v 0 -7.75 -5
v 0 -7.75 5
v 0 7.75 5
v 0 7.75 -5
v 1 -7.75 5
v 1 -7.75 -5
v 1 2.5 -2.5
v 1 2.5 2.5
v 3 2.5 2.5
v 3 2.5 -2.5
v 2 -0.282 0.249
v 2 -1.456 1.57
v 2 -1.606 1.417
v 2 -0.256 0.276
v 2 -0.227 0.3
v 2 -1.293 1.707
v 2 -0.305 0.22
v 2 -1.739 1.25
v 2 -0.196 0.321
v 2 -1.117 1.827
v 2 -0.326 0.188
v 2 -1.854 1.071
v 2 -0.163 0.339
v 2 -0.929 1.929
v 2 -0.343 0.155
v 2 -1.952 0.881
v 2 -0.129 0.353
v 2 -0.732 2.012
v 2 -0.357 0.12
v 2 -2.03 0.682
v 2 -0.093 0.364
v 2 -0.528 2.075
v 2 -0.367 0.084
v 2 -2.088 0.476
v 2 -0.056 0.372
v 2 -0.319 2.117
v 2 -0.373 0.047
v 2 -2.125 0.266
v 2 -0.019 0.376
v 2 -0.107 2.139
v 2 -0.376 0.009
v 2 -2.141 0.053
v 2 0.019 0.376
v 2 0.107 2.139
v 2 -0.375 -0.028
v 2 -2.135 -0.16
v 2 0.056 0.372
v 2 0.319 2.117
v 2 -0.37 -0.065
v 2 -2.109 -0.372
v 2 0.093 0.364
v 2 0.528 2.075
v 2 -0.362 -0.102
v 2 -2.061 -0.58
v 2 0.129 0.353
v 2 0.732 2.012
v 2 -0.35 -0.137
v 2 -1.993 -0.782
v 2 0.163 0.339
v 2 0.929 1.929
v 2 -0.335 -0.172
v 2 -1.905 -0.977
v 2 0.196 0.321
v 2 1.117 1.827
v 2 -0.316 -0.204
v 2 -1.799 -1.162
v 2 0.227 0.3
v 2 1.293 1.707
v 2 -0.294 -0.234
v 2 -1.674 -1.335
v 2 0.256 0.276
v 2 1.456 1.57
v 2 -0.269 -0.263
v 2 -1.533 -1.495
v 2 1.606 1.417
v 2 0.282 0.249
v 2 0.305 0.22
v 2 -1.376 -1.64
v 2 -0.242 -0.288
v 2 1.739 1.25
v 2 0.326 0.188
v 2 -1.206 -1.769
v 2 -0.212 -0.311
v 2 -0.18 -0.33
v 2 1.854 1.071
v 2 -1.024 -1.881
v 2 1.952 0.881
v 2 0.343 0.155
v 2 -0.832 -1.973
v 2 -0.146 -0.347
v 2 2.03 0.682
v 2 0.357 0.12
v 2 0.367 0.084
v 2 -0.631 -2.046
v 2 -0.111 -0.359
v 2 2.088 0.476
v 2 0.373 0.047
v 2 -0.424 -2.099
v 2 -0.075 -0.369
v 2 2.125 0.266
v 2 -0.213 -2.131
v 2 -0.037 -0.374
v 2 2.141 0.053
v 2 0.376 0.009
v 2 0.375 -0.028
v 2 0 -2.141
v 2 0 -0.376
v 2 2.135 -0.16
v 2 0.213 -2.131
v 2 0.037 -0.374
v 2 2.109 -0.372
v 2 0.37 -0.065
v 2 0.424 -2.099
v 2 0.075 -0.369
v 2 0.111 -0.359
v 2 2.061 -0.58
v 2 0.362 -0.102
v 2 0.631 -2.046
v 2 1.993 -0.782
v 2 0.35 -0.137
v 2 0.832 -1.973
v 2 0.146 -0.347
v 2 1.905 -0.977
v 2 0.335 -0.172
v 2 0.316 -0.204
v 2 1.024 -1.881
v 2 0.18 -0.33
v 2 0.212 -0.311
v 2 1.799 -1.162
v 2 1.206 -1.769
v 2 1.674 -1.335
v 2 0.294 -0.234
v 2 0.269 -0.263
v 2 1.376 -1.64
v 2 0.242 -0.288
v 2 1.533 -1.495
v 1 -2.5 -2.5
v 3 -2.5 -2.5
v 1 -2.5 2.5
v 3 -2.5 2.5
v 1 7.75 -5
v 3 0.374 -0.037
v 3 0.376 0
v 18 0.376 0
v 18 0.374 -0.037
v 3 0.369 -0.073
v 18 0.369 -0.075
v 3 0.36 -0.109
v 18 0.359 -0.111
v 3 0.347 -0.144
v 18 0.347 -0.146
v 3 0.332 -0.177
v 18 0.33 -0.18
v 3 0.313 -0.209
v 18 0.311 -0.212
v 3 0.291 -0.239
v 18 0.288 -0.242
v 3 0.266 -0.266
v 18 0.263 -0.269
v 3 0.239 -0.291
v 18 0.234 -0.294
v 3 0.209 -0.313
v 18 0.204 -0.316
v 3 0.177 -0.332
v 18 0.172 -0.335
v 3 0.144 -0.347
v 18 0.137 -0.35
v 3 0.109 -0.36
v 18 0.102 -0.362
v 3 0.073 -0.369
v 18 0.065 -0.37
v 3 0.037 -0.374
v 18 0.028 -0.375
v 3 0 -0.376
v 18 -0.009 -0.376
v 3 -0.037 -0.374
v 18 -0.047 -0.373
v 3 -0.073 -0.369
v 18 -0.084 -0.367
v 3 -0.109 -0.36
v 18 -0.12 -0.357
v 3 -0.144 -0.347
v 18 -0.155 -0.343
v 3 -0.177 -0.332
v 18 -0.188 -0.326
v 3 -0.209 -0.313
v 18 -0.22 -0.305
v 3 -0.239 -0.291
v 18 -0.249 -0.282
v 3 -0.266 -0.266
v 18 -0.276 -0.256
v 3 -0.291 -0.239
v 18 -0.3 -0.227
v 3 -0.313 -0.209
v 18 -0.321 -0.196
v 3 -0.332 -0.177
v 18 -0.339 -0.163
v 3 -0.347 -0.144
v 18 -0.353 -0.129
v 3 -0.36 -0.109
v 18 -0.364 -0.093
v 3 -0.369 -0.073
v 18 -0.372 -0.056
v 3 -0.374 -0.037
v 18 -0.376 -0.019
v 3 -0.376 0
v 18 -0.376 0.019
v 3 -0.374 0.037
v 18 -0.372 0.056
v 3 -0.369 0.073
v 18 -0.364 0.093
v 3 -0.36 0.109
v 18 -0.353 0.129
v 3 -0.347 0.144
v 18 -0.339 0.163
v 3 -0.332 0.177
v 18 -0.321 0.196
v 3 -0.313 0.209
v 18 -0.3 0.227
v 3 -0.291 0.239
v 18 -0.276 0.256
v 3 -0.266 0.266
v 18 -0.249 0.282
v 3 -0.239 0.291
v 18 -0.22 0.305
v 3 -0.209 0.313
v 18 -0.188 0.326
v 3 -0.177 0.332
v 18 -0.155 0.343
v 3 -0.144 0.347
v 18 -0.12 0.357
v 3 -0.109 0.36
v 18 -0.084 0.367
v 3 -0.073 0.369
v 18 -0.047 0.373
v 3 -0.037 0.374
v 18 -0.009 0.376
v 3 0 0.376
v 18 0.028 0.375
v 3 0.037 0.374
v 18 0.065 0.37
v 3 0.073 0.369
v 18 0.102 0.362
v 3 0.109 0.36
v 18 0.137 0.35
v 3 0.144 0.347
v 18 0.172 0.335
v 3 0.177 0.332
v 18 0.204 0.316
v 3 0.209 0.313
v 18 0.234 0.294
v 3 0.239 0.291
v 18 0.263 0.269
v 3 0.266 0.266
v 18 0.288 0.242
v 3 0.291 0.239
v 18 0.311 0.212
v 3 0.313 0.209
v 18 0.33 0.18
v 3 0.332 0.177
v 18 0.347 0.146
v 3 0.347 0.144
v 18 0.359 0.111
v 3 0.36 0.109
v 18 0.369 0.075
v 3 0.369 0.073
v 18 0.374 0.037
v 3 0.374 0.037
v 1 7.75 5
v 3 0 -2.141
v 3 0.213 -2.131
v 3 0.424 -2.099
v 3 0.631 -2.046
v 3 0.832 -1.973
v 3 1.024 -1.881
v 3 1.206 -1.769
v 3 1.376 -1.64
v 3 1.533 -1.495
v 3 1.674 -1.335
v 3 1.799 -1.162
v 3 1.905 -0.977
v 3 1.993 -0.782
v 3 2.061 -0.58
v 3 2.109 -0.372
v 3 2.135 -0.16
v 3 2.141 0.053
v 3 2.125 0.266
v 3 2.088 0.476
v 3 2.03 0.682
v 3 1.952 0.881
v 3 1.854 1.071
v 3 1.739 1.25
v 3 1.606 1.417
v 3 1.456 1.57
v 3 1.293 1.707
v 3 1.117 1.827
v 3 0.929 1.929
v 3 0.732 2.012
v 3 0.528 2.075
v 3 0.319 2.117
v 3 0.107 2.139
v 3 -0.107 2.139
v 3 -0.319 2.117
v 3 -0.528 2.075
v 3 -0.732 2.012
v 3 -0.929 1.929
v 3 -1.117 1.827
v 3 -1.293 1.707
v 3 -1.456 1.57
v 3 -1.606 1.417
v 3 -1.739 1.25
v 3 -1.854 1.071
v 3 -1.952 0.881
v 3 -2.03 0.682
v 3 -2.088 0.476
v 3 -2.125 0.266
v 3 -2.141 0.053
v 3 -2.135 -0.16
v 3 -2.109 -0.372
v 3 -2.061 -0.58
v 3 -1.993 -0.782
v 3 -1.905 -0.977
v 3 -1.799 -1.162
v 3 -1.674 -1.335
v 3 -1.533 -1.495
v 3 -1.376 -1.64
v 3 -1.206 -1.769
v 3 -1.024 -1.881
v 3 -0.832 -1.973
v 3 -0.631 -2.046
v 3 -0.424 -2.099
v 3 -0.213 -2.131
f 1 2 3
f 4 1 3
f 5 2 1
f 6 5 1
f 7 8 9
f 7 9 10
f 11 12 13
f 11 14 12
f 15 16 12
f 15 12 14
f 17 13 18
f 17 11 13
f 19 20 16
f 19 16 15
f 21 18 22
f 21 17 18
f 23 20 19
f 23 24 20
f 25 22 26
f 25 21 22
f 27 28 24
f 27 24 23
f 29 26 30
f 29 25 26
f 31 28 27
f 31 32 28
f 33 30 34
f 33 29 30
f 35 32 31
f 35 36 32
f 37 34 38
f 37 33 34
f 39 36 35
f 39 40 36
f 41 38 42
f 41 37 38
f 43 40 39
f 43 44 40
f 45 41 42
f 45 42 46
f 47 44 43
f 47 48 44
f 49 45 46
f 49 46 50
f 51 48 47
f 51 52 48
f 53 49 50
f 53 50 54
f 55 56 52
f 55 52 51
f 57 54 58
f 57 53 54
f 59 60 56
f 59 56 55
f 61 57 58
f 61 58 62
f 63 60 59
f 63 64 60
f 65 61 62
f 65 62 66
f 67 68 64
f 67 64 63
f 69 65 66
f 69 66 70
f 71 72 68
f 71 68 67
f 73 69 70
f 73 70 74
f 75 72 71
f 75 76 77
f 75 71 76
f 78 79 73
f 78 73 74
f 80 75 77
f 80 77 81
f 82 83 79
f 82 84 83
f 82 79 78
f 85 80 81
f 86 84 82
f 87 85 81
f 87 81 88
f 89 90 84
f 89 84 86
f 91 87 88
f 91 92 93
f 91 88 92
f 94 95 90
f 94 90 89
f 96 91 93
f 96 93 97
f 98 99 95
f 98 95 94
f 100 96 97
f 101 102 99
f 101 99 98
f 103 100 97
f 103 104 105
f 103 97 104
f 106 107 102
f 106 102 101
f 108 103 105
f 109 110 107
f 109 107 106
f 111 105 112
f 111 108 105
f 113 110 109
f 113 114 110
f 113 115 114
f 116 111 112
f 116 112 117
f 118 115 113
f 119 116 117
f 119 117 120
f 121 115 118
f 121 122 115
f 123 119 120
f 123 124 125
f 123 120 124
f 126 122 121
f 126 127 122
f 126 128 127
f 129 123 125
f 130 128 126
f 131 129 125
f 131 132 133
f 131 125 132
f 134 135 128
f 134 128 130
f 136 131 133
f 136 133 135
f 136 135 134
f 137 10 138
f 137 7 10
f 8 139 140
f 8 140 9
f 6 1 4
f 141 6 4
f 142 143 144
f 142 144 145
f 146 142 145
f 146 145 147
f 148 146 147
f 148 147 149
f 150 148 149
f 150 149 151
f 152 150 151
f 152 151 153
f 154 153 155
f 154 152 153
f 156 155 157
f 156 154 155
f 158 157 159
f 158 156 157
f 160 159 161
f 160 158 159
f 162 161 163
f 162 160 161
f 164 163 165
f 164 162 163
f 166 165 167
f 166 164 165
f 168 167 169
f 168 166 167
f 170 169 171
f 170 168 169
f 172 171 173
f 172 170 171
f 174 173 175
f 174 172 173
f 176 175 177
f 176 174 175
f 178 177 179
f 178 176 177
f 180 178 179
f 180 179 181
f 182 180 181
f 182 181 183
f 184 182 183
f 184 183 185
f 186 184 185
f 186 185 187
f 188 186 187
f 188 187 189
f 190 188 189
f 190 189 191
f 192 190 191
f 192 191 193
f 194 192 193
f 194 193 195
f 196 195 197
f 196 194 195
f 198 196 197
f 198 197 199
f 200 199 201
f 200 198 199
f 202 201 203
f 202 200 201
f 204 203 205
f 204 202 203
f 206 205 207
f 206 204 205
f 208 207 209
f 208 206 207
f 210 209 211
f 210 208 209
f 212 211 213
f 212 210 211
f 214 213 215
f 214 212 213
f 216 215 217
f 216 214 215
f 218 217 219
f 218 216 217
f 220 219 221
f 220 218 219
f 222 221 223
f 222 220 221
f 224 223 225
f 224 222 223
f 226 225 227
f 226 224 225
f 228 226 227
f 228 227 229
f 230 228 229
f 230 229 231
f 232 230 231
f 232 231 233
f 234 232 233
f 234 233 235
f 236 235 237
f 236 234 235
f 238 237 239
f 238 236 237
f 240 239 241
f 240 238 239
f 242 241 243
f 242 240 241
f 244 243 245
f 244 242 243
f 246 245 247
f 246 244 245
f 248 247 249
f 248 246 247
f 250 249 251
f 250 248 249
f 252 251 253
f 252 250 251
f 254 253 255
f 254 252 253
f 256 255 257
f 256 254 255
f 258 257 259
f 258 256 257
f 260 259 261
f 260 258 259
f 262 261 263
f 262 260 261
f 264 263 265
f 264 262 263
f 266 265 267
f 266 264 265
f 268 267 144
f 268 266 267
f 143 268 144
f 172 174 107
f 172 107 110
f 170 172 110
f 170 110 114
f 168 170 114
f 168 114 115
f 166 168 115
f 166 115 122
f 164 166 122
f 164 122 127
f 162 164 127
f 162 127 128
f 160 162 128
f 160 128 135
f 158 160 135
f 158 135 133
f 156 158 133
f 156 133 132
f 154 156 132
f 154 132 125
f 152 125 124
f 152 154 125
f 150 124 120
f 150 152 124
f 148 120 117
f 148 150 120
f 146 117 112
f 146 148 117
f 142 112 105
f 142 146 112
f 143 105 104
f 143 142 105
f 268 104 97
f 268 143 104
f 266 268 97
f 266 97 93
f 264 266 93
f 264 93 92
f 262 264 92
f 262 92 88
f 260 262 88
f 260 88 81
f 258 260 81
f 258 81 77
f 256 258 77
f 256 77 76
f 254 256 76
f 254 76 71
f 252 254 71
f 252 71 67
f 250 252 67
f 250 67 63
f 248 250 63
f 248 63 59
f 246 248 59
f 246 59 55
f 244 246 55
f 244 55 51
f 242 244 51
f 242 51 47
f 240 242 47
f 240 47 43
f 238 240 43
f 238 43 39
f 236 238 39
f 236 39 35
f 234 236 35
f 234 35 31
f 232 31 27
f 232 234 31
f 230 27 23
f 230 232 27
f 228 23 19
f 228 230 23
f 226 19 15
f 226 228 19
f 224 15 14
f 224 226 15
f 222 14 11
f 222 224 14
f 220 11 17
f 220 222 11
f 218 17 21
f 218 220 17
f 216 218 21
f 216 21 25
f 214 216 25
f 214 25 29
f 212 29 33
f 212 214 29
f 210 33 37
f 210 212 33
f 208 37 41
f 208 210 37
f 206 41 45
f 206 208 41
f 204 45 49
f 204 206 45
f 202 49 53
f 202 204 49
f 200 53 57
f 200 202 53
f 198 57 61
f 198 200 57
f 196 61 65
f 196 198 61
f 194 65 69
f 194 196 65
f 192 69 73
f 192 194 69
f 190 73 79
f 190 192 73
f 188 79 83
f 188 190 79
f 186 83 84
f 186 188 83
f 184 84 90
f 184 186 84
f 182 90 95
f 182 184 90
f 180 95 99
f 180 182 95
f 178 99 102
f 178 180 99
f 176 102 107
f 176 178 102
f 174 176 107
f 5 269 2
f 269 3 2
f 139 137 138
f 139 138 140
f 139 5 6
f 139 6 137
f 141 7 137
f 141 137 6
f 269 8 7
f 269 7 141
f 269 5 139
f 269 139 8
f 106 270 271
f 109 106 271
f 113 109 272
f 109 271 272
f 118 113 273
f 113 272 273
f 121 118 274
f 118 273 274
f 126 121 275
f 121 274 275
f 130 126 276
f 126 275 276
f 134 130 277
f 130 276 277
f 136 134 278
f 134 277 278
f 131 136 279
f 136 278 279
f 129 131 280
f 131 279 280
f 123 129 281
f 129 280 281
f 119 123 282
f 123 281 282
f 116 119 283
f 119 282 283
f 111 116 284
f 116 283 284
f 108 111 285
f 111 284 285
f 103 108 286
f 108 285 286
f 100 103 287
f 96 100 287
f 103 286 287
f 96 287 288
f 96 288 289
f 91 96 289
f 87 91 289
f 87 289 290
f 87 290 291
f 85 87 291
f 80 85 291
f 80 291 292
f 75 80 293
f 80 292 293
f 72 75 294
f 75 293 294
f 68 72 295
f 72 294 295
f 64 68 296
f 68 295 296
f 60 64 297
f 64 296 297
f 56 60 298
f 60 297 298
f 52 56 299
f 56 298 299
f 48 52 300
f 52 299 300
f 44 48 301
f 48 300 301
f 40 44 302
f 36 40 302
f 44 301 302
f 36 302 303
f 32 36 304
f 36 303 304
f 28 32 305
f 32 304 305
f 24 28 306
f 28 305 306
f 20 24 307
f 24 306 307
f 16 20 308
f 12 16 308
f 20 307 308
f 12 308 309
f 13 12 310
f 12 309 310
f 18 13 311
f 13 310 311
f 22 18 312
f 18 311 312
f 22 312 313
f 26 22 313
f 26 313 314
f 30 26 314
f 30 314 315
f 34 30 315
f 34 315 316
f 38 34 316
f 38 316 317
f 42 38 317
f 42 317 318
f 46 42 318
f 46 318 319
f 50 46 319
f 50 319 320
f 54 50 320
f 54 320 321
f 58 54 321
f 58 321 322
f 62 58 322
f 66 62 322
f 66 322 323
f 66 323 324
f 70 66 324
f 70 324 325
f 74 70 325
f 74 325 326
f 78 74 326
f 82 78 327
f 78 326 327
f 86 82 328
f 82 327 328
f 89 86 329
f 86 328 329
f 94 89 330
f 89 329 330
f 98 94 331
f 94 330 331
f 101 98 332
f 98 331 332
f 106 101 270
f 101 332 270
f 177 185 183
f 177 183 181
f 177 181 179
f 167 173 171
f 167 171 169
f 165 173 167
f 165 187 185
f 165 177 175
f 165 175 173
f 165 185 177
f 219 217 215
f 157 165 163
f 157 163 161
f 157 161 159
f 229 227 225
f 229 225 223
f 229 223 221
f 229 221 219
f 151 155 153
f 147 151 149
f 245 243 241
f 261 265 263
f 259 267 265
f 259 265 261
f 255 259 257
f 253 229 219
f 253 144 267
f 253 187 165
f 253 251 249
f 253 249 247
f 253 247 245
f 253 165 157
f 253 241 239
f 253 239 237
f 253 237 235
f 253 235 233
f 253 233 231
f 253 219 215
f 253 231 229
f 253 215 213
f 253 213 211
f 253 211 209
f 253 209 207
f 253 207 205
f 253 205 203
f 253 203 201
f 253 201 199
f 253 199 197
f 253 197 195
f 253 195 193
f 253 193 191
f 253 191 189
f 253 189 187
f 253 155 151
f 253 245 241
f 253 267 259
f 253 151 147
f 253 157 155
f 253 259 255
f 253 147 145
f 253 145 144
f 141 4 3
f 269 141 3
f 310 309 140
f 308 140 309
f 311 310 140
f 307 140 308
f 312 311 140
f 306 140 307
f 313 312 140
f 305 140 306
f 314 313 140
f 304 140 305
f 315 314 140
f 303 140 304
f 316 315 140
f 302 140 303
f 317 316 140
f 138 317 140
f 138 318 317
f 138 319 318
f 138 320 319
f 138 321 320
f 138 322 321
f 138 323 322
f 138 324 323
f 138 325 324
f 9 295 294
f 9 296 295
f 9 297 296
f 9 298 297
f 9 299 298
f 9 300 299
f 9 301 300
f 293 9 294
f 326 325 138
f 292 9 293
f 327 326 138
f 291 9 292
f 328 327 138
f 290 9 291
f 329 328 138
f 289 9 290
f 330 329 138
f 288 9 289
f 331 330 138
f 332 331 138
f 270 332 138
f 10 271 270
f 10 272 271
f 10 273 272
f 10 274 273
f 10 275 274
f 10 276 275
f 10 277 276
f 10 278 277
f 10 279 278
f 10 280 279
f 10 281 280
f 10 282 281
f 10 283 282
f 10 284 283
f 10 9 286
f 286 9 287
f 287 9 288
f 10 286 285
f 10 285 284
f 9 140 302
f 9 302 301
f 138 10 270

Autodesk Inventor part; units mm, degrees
ref_plane "YZ Plane" through (0, 0, 0) normal (1, 0, 0) x (0, 1, 0)
ref_plane "XZ Plane" through (0, 0, 0) normal (0, 1, 0) x (-1, 0, 0)
ref_plane "XY Plane" through (0, 0, 0) normal (0, 0, 1) x (1, 0, 0)
sketch "Sketch1" plane through (0, 0, 0) normal (1, 0, 0) x (0, 1, 0)
  line L0 (-7.75, -5) -> (7.75, -5)
  line L1 (7.75, -5) -> (7.75, 5)
  line L2 (7.75, 5) -> (-7.75, 5)
  line L3 (-7.75, 5) -> (-7.75, -5)
  line L4 (-7.75, -5) -> (7.75, 5) construction
  line L5 (7.75, -5) -> (-7.75, 5) construction
  point P0 (0, 0)
  dimension "d0" = 15.5
  dimension "d1" = 10
extrude "Extrusion1" add sketch "Sketch1" along normal blind 1
sketch "Sketch2" plane through (1, 0, 0) normal (1, 0, 0) x (0, 0, -1)
  line L0 (-2.5, 2.5) -> (2.5, 2.5)
  line L1 (2.5, 2.5) -> (2.5, -2.5)
  line L2 (2.5, -2.5) -> (-2.5, -2.5)
  line L3 (-2.5, -2.5) -> (-2.5, 2.5)
  line L4 (-2.5, 2.5) -> (2.5, -2.5) construction
  line L5 (2.5, 2.5) -> (-2.5, -2.5) construction
  point P0 (0, 0)
  dimension "d4" = 5
  dimension "d5" = 5
extrude "Extrusion2" add sketch "Sketch2" along normal blind 2
sketch "Sketch3" plane through (3, 0, 0) normal (1, 0, 0) x (0, 0, -1)
  line L0 (2.5, 2.5) -> (-2.5, 2.5) projected
  line L1 (-2.5, 2.5) -> (-2.5, -2.5) projected
  line L2 (-2.5, -2.5) -> (2.5, -2.5) projected
  line L3 (2.5, -2.5) -> (2.5, 2.5) projected
  circle A0 centre (0, 0) radius 2.1413
  circle A1 centre (0, 0) radius 0.3761
extrude "Extrusion3" cut sketch "Sketch3" against normal blind 1 contours A0
sketch "Sketch4" plane through (3, 0, 2.362) normal (1, 0, 0) x (0, 1, 0)
  circle A0 centre (0, -2.362) radius 0.3761 projected
extrude "Extrusion4" add sketch "Sketch4" along normal blind 15
ref_plane "Work Plane1" through (0, 0, 5) normal (0, 1, 0) x (1, 0, 0)
properties part number "00_LED_neopixel_single"
